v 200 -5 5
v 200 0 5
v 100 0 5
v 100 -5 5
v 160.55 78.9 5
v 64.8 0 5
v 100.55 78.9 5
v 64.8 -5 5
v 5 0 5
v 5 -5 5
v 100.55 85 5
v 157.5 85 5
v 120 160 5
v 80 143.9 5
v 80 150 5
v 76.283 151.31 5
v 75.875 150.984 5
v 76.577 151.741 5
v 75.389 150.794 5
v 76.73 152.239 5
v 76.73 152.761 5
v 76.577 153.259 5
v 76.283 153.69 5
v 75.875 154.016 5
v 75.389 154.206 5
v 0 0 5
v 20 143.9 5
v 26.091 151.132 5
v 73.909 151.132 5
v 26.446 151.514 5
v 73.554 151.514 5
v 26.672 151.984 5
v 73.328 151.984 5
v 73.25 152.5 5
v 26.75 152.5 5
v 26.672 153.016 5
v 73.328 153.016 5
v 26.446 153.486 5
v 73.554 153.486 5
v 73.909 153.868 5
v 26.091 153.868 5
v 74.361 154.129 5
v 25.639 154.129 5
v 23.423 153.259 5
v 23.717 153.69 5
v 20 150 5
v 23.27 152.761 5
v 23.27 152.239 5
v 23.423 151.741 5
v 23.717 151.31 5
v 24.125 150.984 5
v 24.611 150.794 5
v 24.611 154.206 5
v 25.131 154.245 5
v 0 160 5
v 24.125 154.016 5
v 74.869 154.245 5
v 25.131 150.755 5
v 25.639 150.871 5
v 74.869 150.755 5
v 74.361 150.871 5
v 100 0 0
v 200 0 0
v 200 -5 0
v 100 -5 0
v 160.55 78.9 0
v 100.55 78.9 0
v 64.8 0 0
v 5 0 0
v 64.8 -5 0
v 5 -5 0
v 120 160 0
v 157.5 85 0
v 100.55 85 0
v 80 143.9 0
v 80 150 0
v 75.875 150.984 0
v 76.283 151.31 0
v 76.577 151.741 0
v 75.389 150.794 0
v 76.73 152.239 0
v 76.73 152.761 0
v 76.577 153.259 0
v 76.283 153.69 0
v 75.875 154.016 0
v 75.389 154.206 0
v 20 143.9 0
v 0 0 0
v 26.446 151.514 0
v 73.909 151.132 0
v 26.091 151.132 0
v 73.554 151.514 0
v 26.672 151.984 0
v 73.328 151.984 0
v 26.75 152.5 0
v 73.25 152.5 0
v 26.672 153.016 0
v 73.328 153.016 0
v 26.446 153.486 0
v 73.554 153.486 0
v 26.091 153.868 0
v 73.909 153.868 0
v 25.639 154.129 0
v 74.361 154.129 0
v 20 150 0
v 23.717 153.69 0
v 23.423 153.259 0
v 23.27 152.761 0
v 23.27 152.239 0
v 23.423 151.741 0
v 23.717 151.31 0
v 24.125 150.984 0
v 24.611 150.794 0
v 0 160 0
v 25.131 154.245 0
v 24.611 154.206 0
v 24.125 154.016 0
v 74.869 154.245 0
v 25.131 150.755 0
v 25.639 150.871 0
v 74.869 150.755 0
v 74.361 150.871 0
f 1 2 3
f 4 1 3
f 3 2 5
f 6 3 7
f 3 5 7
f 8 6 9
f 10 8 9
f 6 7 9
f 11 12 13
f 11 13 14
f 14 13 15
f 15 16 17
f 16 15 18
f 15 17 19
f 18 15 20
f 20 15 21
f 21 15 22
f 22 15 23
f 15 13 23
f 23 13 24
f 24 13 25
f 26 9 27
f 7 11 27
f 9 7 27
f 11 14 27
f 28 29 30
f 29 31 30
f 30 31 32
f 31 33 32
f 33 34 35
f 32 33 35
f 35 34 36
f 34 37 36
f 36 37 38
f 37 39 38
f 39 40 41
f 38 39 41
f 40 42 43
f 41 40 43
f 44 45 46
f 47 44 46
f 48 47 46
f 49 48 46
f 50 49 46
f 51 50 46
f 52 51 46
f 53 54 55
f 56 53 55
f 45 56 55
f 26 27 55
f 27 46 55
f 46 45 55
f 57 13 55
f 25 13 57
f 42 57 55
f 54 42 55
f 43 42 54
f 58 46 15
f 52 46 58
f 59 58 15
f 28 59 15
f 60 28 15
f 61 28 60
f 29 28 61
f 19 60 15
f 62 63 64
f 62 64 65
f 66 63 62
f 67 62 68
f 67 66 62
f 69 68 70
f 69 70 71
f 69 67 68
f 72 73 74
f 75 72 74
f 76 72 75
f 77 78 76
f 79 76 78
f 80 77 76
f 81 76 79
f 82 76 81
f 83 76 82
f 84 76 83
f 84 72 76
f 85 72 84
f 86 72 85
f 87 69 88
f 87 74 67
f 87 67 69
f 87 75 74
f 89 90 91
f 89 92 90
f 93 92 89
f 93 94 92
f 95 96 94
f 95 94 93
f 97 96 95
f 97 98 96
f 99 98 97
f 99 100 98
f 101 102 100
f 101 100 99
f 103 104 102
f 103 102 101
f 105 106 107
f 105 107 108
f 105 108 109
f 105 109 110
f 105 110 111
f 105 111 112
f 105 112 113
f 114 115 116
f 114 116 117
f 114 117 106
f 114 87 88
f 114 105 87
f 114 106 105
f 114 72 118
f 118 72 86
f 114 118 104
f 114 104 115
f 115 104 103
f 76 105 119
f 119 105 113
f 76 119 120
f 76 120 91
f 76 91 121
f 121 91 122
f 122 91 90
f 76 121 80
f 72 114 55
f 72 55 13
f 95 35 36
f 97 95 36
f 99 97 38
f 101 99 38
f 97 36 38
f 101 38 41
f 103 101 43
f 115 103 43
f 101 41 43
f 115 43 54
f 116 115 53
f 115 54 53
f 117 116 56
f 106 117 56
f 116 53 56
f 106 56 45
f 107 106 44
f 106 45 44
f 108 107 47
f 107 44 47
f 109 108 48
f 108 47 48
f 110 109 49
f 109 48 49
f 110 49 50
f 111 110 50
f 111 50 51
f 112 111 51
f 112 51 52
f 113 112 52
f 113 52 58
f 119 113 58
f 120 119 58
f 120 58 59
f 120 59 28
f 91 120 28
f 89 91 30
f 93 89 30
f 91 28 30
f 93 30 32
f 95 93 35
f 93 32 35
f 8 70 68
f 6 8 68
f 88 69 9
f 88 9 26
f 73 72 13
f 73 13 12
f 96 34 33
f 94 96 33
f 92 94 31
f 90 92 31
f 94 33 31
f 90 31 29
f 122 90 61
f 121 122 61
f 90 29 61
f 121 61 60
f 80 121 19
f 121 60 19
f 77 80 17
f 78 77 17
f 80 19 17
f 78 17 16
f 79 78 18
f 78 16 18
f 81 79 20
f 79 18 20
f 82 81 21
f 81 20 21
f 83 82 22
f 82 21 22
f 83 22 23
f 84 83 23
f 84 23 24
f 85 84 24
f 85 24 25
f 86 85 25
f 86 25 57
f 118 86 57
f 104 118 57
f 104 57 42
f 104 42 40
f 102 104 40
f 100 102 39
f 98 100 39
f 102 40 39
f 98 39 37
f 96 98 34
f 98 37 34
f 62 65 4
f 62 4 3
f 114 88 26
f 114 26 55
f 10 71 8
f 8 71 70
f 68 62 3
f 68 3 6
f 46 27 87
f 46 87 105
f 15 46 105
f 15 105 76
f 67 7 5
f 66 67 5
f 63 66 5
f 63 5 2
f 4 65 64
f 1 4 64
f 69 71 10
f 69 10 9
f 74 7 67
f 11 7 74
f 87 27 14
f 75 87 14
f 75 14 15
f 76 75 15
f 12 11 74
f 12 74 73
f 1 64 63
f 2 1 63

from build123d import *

# Parameters (mm, degrees)
SKETCH1_W           = 100
SKETCH1_H           = 5
SKETCH1_W_2         = 59.8
BOSS_EXTRUDE1_DEPTH = 5
SKETCH2_W           = 60
SKETCH2_H           = 6.1
CUT_EXTRUDE1_DEPTH  = 5
SKETCH3_R           = 1.75
CUT_EXTRUDE2_DEPTH  = 5
SKETCH4_W           = 60
SKETCH4_H           = 6.1
CUT_EXTRUDE3_DEPTH  = 5


with BuildPart() as part:
    # Sketch1 → Boss-Extrude1 (new body)
    with BuildSketch(Plane.XY):
        Polygon((120, 160), (200, 0), (0, 0), (0, 160), align=None)
        with Locations((150, -2.5)):
            Rectangle(SKETCH1_W, SKETCH1_H)
        with Locations((34.9, -2.5)):
            Rectangle(SKETCH1_W_2, SKETCH1_H)
    extrude(amount=BOSS_EXTRUDE1_DEPTH)

    # Sketch2 → Cut-Extrude1 (cut)
    with BuildSketch(Plane.XY.offset(5)):
        with Locations((50, 146.95)):
            Rectangle(SKETCH2_W, SKETCH2_H)
    extrude(amount=-CUT_EXTRUDE1_DEPTH, mode=Mode.SUBTRACT)

    # Sketch3 → Cut-Extrude2 (cut)
    with BuildSketch(Plane.XY.offset(5)):
        with Locations((25, 152.5)):
            Circle(SKETCH3_R)
        with Locations(Location((75, 152.5, 0), (0, 0, 180))):
            Circle(SKETCH3_R)
    extrude(amount=-CUT_EXTRUDE2_DEPTH, mode=Mode.SUBTRACT)

    # Sketch4 → Cut-Extrude3 (cut)
    with BuildSketch(Plane.XY.offset(5)):
        with Locations((130.55, 81.95)):
            Rectangle(SKETCH4_W, SKETCH4_H)
    extrude(amount=-CUT_EXTRUDE3_DEPTH, mode=Mode.SUBTRACT)


solid = part.part
